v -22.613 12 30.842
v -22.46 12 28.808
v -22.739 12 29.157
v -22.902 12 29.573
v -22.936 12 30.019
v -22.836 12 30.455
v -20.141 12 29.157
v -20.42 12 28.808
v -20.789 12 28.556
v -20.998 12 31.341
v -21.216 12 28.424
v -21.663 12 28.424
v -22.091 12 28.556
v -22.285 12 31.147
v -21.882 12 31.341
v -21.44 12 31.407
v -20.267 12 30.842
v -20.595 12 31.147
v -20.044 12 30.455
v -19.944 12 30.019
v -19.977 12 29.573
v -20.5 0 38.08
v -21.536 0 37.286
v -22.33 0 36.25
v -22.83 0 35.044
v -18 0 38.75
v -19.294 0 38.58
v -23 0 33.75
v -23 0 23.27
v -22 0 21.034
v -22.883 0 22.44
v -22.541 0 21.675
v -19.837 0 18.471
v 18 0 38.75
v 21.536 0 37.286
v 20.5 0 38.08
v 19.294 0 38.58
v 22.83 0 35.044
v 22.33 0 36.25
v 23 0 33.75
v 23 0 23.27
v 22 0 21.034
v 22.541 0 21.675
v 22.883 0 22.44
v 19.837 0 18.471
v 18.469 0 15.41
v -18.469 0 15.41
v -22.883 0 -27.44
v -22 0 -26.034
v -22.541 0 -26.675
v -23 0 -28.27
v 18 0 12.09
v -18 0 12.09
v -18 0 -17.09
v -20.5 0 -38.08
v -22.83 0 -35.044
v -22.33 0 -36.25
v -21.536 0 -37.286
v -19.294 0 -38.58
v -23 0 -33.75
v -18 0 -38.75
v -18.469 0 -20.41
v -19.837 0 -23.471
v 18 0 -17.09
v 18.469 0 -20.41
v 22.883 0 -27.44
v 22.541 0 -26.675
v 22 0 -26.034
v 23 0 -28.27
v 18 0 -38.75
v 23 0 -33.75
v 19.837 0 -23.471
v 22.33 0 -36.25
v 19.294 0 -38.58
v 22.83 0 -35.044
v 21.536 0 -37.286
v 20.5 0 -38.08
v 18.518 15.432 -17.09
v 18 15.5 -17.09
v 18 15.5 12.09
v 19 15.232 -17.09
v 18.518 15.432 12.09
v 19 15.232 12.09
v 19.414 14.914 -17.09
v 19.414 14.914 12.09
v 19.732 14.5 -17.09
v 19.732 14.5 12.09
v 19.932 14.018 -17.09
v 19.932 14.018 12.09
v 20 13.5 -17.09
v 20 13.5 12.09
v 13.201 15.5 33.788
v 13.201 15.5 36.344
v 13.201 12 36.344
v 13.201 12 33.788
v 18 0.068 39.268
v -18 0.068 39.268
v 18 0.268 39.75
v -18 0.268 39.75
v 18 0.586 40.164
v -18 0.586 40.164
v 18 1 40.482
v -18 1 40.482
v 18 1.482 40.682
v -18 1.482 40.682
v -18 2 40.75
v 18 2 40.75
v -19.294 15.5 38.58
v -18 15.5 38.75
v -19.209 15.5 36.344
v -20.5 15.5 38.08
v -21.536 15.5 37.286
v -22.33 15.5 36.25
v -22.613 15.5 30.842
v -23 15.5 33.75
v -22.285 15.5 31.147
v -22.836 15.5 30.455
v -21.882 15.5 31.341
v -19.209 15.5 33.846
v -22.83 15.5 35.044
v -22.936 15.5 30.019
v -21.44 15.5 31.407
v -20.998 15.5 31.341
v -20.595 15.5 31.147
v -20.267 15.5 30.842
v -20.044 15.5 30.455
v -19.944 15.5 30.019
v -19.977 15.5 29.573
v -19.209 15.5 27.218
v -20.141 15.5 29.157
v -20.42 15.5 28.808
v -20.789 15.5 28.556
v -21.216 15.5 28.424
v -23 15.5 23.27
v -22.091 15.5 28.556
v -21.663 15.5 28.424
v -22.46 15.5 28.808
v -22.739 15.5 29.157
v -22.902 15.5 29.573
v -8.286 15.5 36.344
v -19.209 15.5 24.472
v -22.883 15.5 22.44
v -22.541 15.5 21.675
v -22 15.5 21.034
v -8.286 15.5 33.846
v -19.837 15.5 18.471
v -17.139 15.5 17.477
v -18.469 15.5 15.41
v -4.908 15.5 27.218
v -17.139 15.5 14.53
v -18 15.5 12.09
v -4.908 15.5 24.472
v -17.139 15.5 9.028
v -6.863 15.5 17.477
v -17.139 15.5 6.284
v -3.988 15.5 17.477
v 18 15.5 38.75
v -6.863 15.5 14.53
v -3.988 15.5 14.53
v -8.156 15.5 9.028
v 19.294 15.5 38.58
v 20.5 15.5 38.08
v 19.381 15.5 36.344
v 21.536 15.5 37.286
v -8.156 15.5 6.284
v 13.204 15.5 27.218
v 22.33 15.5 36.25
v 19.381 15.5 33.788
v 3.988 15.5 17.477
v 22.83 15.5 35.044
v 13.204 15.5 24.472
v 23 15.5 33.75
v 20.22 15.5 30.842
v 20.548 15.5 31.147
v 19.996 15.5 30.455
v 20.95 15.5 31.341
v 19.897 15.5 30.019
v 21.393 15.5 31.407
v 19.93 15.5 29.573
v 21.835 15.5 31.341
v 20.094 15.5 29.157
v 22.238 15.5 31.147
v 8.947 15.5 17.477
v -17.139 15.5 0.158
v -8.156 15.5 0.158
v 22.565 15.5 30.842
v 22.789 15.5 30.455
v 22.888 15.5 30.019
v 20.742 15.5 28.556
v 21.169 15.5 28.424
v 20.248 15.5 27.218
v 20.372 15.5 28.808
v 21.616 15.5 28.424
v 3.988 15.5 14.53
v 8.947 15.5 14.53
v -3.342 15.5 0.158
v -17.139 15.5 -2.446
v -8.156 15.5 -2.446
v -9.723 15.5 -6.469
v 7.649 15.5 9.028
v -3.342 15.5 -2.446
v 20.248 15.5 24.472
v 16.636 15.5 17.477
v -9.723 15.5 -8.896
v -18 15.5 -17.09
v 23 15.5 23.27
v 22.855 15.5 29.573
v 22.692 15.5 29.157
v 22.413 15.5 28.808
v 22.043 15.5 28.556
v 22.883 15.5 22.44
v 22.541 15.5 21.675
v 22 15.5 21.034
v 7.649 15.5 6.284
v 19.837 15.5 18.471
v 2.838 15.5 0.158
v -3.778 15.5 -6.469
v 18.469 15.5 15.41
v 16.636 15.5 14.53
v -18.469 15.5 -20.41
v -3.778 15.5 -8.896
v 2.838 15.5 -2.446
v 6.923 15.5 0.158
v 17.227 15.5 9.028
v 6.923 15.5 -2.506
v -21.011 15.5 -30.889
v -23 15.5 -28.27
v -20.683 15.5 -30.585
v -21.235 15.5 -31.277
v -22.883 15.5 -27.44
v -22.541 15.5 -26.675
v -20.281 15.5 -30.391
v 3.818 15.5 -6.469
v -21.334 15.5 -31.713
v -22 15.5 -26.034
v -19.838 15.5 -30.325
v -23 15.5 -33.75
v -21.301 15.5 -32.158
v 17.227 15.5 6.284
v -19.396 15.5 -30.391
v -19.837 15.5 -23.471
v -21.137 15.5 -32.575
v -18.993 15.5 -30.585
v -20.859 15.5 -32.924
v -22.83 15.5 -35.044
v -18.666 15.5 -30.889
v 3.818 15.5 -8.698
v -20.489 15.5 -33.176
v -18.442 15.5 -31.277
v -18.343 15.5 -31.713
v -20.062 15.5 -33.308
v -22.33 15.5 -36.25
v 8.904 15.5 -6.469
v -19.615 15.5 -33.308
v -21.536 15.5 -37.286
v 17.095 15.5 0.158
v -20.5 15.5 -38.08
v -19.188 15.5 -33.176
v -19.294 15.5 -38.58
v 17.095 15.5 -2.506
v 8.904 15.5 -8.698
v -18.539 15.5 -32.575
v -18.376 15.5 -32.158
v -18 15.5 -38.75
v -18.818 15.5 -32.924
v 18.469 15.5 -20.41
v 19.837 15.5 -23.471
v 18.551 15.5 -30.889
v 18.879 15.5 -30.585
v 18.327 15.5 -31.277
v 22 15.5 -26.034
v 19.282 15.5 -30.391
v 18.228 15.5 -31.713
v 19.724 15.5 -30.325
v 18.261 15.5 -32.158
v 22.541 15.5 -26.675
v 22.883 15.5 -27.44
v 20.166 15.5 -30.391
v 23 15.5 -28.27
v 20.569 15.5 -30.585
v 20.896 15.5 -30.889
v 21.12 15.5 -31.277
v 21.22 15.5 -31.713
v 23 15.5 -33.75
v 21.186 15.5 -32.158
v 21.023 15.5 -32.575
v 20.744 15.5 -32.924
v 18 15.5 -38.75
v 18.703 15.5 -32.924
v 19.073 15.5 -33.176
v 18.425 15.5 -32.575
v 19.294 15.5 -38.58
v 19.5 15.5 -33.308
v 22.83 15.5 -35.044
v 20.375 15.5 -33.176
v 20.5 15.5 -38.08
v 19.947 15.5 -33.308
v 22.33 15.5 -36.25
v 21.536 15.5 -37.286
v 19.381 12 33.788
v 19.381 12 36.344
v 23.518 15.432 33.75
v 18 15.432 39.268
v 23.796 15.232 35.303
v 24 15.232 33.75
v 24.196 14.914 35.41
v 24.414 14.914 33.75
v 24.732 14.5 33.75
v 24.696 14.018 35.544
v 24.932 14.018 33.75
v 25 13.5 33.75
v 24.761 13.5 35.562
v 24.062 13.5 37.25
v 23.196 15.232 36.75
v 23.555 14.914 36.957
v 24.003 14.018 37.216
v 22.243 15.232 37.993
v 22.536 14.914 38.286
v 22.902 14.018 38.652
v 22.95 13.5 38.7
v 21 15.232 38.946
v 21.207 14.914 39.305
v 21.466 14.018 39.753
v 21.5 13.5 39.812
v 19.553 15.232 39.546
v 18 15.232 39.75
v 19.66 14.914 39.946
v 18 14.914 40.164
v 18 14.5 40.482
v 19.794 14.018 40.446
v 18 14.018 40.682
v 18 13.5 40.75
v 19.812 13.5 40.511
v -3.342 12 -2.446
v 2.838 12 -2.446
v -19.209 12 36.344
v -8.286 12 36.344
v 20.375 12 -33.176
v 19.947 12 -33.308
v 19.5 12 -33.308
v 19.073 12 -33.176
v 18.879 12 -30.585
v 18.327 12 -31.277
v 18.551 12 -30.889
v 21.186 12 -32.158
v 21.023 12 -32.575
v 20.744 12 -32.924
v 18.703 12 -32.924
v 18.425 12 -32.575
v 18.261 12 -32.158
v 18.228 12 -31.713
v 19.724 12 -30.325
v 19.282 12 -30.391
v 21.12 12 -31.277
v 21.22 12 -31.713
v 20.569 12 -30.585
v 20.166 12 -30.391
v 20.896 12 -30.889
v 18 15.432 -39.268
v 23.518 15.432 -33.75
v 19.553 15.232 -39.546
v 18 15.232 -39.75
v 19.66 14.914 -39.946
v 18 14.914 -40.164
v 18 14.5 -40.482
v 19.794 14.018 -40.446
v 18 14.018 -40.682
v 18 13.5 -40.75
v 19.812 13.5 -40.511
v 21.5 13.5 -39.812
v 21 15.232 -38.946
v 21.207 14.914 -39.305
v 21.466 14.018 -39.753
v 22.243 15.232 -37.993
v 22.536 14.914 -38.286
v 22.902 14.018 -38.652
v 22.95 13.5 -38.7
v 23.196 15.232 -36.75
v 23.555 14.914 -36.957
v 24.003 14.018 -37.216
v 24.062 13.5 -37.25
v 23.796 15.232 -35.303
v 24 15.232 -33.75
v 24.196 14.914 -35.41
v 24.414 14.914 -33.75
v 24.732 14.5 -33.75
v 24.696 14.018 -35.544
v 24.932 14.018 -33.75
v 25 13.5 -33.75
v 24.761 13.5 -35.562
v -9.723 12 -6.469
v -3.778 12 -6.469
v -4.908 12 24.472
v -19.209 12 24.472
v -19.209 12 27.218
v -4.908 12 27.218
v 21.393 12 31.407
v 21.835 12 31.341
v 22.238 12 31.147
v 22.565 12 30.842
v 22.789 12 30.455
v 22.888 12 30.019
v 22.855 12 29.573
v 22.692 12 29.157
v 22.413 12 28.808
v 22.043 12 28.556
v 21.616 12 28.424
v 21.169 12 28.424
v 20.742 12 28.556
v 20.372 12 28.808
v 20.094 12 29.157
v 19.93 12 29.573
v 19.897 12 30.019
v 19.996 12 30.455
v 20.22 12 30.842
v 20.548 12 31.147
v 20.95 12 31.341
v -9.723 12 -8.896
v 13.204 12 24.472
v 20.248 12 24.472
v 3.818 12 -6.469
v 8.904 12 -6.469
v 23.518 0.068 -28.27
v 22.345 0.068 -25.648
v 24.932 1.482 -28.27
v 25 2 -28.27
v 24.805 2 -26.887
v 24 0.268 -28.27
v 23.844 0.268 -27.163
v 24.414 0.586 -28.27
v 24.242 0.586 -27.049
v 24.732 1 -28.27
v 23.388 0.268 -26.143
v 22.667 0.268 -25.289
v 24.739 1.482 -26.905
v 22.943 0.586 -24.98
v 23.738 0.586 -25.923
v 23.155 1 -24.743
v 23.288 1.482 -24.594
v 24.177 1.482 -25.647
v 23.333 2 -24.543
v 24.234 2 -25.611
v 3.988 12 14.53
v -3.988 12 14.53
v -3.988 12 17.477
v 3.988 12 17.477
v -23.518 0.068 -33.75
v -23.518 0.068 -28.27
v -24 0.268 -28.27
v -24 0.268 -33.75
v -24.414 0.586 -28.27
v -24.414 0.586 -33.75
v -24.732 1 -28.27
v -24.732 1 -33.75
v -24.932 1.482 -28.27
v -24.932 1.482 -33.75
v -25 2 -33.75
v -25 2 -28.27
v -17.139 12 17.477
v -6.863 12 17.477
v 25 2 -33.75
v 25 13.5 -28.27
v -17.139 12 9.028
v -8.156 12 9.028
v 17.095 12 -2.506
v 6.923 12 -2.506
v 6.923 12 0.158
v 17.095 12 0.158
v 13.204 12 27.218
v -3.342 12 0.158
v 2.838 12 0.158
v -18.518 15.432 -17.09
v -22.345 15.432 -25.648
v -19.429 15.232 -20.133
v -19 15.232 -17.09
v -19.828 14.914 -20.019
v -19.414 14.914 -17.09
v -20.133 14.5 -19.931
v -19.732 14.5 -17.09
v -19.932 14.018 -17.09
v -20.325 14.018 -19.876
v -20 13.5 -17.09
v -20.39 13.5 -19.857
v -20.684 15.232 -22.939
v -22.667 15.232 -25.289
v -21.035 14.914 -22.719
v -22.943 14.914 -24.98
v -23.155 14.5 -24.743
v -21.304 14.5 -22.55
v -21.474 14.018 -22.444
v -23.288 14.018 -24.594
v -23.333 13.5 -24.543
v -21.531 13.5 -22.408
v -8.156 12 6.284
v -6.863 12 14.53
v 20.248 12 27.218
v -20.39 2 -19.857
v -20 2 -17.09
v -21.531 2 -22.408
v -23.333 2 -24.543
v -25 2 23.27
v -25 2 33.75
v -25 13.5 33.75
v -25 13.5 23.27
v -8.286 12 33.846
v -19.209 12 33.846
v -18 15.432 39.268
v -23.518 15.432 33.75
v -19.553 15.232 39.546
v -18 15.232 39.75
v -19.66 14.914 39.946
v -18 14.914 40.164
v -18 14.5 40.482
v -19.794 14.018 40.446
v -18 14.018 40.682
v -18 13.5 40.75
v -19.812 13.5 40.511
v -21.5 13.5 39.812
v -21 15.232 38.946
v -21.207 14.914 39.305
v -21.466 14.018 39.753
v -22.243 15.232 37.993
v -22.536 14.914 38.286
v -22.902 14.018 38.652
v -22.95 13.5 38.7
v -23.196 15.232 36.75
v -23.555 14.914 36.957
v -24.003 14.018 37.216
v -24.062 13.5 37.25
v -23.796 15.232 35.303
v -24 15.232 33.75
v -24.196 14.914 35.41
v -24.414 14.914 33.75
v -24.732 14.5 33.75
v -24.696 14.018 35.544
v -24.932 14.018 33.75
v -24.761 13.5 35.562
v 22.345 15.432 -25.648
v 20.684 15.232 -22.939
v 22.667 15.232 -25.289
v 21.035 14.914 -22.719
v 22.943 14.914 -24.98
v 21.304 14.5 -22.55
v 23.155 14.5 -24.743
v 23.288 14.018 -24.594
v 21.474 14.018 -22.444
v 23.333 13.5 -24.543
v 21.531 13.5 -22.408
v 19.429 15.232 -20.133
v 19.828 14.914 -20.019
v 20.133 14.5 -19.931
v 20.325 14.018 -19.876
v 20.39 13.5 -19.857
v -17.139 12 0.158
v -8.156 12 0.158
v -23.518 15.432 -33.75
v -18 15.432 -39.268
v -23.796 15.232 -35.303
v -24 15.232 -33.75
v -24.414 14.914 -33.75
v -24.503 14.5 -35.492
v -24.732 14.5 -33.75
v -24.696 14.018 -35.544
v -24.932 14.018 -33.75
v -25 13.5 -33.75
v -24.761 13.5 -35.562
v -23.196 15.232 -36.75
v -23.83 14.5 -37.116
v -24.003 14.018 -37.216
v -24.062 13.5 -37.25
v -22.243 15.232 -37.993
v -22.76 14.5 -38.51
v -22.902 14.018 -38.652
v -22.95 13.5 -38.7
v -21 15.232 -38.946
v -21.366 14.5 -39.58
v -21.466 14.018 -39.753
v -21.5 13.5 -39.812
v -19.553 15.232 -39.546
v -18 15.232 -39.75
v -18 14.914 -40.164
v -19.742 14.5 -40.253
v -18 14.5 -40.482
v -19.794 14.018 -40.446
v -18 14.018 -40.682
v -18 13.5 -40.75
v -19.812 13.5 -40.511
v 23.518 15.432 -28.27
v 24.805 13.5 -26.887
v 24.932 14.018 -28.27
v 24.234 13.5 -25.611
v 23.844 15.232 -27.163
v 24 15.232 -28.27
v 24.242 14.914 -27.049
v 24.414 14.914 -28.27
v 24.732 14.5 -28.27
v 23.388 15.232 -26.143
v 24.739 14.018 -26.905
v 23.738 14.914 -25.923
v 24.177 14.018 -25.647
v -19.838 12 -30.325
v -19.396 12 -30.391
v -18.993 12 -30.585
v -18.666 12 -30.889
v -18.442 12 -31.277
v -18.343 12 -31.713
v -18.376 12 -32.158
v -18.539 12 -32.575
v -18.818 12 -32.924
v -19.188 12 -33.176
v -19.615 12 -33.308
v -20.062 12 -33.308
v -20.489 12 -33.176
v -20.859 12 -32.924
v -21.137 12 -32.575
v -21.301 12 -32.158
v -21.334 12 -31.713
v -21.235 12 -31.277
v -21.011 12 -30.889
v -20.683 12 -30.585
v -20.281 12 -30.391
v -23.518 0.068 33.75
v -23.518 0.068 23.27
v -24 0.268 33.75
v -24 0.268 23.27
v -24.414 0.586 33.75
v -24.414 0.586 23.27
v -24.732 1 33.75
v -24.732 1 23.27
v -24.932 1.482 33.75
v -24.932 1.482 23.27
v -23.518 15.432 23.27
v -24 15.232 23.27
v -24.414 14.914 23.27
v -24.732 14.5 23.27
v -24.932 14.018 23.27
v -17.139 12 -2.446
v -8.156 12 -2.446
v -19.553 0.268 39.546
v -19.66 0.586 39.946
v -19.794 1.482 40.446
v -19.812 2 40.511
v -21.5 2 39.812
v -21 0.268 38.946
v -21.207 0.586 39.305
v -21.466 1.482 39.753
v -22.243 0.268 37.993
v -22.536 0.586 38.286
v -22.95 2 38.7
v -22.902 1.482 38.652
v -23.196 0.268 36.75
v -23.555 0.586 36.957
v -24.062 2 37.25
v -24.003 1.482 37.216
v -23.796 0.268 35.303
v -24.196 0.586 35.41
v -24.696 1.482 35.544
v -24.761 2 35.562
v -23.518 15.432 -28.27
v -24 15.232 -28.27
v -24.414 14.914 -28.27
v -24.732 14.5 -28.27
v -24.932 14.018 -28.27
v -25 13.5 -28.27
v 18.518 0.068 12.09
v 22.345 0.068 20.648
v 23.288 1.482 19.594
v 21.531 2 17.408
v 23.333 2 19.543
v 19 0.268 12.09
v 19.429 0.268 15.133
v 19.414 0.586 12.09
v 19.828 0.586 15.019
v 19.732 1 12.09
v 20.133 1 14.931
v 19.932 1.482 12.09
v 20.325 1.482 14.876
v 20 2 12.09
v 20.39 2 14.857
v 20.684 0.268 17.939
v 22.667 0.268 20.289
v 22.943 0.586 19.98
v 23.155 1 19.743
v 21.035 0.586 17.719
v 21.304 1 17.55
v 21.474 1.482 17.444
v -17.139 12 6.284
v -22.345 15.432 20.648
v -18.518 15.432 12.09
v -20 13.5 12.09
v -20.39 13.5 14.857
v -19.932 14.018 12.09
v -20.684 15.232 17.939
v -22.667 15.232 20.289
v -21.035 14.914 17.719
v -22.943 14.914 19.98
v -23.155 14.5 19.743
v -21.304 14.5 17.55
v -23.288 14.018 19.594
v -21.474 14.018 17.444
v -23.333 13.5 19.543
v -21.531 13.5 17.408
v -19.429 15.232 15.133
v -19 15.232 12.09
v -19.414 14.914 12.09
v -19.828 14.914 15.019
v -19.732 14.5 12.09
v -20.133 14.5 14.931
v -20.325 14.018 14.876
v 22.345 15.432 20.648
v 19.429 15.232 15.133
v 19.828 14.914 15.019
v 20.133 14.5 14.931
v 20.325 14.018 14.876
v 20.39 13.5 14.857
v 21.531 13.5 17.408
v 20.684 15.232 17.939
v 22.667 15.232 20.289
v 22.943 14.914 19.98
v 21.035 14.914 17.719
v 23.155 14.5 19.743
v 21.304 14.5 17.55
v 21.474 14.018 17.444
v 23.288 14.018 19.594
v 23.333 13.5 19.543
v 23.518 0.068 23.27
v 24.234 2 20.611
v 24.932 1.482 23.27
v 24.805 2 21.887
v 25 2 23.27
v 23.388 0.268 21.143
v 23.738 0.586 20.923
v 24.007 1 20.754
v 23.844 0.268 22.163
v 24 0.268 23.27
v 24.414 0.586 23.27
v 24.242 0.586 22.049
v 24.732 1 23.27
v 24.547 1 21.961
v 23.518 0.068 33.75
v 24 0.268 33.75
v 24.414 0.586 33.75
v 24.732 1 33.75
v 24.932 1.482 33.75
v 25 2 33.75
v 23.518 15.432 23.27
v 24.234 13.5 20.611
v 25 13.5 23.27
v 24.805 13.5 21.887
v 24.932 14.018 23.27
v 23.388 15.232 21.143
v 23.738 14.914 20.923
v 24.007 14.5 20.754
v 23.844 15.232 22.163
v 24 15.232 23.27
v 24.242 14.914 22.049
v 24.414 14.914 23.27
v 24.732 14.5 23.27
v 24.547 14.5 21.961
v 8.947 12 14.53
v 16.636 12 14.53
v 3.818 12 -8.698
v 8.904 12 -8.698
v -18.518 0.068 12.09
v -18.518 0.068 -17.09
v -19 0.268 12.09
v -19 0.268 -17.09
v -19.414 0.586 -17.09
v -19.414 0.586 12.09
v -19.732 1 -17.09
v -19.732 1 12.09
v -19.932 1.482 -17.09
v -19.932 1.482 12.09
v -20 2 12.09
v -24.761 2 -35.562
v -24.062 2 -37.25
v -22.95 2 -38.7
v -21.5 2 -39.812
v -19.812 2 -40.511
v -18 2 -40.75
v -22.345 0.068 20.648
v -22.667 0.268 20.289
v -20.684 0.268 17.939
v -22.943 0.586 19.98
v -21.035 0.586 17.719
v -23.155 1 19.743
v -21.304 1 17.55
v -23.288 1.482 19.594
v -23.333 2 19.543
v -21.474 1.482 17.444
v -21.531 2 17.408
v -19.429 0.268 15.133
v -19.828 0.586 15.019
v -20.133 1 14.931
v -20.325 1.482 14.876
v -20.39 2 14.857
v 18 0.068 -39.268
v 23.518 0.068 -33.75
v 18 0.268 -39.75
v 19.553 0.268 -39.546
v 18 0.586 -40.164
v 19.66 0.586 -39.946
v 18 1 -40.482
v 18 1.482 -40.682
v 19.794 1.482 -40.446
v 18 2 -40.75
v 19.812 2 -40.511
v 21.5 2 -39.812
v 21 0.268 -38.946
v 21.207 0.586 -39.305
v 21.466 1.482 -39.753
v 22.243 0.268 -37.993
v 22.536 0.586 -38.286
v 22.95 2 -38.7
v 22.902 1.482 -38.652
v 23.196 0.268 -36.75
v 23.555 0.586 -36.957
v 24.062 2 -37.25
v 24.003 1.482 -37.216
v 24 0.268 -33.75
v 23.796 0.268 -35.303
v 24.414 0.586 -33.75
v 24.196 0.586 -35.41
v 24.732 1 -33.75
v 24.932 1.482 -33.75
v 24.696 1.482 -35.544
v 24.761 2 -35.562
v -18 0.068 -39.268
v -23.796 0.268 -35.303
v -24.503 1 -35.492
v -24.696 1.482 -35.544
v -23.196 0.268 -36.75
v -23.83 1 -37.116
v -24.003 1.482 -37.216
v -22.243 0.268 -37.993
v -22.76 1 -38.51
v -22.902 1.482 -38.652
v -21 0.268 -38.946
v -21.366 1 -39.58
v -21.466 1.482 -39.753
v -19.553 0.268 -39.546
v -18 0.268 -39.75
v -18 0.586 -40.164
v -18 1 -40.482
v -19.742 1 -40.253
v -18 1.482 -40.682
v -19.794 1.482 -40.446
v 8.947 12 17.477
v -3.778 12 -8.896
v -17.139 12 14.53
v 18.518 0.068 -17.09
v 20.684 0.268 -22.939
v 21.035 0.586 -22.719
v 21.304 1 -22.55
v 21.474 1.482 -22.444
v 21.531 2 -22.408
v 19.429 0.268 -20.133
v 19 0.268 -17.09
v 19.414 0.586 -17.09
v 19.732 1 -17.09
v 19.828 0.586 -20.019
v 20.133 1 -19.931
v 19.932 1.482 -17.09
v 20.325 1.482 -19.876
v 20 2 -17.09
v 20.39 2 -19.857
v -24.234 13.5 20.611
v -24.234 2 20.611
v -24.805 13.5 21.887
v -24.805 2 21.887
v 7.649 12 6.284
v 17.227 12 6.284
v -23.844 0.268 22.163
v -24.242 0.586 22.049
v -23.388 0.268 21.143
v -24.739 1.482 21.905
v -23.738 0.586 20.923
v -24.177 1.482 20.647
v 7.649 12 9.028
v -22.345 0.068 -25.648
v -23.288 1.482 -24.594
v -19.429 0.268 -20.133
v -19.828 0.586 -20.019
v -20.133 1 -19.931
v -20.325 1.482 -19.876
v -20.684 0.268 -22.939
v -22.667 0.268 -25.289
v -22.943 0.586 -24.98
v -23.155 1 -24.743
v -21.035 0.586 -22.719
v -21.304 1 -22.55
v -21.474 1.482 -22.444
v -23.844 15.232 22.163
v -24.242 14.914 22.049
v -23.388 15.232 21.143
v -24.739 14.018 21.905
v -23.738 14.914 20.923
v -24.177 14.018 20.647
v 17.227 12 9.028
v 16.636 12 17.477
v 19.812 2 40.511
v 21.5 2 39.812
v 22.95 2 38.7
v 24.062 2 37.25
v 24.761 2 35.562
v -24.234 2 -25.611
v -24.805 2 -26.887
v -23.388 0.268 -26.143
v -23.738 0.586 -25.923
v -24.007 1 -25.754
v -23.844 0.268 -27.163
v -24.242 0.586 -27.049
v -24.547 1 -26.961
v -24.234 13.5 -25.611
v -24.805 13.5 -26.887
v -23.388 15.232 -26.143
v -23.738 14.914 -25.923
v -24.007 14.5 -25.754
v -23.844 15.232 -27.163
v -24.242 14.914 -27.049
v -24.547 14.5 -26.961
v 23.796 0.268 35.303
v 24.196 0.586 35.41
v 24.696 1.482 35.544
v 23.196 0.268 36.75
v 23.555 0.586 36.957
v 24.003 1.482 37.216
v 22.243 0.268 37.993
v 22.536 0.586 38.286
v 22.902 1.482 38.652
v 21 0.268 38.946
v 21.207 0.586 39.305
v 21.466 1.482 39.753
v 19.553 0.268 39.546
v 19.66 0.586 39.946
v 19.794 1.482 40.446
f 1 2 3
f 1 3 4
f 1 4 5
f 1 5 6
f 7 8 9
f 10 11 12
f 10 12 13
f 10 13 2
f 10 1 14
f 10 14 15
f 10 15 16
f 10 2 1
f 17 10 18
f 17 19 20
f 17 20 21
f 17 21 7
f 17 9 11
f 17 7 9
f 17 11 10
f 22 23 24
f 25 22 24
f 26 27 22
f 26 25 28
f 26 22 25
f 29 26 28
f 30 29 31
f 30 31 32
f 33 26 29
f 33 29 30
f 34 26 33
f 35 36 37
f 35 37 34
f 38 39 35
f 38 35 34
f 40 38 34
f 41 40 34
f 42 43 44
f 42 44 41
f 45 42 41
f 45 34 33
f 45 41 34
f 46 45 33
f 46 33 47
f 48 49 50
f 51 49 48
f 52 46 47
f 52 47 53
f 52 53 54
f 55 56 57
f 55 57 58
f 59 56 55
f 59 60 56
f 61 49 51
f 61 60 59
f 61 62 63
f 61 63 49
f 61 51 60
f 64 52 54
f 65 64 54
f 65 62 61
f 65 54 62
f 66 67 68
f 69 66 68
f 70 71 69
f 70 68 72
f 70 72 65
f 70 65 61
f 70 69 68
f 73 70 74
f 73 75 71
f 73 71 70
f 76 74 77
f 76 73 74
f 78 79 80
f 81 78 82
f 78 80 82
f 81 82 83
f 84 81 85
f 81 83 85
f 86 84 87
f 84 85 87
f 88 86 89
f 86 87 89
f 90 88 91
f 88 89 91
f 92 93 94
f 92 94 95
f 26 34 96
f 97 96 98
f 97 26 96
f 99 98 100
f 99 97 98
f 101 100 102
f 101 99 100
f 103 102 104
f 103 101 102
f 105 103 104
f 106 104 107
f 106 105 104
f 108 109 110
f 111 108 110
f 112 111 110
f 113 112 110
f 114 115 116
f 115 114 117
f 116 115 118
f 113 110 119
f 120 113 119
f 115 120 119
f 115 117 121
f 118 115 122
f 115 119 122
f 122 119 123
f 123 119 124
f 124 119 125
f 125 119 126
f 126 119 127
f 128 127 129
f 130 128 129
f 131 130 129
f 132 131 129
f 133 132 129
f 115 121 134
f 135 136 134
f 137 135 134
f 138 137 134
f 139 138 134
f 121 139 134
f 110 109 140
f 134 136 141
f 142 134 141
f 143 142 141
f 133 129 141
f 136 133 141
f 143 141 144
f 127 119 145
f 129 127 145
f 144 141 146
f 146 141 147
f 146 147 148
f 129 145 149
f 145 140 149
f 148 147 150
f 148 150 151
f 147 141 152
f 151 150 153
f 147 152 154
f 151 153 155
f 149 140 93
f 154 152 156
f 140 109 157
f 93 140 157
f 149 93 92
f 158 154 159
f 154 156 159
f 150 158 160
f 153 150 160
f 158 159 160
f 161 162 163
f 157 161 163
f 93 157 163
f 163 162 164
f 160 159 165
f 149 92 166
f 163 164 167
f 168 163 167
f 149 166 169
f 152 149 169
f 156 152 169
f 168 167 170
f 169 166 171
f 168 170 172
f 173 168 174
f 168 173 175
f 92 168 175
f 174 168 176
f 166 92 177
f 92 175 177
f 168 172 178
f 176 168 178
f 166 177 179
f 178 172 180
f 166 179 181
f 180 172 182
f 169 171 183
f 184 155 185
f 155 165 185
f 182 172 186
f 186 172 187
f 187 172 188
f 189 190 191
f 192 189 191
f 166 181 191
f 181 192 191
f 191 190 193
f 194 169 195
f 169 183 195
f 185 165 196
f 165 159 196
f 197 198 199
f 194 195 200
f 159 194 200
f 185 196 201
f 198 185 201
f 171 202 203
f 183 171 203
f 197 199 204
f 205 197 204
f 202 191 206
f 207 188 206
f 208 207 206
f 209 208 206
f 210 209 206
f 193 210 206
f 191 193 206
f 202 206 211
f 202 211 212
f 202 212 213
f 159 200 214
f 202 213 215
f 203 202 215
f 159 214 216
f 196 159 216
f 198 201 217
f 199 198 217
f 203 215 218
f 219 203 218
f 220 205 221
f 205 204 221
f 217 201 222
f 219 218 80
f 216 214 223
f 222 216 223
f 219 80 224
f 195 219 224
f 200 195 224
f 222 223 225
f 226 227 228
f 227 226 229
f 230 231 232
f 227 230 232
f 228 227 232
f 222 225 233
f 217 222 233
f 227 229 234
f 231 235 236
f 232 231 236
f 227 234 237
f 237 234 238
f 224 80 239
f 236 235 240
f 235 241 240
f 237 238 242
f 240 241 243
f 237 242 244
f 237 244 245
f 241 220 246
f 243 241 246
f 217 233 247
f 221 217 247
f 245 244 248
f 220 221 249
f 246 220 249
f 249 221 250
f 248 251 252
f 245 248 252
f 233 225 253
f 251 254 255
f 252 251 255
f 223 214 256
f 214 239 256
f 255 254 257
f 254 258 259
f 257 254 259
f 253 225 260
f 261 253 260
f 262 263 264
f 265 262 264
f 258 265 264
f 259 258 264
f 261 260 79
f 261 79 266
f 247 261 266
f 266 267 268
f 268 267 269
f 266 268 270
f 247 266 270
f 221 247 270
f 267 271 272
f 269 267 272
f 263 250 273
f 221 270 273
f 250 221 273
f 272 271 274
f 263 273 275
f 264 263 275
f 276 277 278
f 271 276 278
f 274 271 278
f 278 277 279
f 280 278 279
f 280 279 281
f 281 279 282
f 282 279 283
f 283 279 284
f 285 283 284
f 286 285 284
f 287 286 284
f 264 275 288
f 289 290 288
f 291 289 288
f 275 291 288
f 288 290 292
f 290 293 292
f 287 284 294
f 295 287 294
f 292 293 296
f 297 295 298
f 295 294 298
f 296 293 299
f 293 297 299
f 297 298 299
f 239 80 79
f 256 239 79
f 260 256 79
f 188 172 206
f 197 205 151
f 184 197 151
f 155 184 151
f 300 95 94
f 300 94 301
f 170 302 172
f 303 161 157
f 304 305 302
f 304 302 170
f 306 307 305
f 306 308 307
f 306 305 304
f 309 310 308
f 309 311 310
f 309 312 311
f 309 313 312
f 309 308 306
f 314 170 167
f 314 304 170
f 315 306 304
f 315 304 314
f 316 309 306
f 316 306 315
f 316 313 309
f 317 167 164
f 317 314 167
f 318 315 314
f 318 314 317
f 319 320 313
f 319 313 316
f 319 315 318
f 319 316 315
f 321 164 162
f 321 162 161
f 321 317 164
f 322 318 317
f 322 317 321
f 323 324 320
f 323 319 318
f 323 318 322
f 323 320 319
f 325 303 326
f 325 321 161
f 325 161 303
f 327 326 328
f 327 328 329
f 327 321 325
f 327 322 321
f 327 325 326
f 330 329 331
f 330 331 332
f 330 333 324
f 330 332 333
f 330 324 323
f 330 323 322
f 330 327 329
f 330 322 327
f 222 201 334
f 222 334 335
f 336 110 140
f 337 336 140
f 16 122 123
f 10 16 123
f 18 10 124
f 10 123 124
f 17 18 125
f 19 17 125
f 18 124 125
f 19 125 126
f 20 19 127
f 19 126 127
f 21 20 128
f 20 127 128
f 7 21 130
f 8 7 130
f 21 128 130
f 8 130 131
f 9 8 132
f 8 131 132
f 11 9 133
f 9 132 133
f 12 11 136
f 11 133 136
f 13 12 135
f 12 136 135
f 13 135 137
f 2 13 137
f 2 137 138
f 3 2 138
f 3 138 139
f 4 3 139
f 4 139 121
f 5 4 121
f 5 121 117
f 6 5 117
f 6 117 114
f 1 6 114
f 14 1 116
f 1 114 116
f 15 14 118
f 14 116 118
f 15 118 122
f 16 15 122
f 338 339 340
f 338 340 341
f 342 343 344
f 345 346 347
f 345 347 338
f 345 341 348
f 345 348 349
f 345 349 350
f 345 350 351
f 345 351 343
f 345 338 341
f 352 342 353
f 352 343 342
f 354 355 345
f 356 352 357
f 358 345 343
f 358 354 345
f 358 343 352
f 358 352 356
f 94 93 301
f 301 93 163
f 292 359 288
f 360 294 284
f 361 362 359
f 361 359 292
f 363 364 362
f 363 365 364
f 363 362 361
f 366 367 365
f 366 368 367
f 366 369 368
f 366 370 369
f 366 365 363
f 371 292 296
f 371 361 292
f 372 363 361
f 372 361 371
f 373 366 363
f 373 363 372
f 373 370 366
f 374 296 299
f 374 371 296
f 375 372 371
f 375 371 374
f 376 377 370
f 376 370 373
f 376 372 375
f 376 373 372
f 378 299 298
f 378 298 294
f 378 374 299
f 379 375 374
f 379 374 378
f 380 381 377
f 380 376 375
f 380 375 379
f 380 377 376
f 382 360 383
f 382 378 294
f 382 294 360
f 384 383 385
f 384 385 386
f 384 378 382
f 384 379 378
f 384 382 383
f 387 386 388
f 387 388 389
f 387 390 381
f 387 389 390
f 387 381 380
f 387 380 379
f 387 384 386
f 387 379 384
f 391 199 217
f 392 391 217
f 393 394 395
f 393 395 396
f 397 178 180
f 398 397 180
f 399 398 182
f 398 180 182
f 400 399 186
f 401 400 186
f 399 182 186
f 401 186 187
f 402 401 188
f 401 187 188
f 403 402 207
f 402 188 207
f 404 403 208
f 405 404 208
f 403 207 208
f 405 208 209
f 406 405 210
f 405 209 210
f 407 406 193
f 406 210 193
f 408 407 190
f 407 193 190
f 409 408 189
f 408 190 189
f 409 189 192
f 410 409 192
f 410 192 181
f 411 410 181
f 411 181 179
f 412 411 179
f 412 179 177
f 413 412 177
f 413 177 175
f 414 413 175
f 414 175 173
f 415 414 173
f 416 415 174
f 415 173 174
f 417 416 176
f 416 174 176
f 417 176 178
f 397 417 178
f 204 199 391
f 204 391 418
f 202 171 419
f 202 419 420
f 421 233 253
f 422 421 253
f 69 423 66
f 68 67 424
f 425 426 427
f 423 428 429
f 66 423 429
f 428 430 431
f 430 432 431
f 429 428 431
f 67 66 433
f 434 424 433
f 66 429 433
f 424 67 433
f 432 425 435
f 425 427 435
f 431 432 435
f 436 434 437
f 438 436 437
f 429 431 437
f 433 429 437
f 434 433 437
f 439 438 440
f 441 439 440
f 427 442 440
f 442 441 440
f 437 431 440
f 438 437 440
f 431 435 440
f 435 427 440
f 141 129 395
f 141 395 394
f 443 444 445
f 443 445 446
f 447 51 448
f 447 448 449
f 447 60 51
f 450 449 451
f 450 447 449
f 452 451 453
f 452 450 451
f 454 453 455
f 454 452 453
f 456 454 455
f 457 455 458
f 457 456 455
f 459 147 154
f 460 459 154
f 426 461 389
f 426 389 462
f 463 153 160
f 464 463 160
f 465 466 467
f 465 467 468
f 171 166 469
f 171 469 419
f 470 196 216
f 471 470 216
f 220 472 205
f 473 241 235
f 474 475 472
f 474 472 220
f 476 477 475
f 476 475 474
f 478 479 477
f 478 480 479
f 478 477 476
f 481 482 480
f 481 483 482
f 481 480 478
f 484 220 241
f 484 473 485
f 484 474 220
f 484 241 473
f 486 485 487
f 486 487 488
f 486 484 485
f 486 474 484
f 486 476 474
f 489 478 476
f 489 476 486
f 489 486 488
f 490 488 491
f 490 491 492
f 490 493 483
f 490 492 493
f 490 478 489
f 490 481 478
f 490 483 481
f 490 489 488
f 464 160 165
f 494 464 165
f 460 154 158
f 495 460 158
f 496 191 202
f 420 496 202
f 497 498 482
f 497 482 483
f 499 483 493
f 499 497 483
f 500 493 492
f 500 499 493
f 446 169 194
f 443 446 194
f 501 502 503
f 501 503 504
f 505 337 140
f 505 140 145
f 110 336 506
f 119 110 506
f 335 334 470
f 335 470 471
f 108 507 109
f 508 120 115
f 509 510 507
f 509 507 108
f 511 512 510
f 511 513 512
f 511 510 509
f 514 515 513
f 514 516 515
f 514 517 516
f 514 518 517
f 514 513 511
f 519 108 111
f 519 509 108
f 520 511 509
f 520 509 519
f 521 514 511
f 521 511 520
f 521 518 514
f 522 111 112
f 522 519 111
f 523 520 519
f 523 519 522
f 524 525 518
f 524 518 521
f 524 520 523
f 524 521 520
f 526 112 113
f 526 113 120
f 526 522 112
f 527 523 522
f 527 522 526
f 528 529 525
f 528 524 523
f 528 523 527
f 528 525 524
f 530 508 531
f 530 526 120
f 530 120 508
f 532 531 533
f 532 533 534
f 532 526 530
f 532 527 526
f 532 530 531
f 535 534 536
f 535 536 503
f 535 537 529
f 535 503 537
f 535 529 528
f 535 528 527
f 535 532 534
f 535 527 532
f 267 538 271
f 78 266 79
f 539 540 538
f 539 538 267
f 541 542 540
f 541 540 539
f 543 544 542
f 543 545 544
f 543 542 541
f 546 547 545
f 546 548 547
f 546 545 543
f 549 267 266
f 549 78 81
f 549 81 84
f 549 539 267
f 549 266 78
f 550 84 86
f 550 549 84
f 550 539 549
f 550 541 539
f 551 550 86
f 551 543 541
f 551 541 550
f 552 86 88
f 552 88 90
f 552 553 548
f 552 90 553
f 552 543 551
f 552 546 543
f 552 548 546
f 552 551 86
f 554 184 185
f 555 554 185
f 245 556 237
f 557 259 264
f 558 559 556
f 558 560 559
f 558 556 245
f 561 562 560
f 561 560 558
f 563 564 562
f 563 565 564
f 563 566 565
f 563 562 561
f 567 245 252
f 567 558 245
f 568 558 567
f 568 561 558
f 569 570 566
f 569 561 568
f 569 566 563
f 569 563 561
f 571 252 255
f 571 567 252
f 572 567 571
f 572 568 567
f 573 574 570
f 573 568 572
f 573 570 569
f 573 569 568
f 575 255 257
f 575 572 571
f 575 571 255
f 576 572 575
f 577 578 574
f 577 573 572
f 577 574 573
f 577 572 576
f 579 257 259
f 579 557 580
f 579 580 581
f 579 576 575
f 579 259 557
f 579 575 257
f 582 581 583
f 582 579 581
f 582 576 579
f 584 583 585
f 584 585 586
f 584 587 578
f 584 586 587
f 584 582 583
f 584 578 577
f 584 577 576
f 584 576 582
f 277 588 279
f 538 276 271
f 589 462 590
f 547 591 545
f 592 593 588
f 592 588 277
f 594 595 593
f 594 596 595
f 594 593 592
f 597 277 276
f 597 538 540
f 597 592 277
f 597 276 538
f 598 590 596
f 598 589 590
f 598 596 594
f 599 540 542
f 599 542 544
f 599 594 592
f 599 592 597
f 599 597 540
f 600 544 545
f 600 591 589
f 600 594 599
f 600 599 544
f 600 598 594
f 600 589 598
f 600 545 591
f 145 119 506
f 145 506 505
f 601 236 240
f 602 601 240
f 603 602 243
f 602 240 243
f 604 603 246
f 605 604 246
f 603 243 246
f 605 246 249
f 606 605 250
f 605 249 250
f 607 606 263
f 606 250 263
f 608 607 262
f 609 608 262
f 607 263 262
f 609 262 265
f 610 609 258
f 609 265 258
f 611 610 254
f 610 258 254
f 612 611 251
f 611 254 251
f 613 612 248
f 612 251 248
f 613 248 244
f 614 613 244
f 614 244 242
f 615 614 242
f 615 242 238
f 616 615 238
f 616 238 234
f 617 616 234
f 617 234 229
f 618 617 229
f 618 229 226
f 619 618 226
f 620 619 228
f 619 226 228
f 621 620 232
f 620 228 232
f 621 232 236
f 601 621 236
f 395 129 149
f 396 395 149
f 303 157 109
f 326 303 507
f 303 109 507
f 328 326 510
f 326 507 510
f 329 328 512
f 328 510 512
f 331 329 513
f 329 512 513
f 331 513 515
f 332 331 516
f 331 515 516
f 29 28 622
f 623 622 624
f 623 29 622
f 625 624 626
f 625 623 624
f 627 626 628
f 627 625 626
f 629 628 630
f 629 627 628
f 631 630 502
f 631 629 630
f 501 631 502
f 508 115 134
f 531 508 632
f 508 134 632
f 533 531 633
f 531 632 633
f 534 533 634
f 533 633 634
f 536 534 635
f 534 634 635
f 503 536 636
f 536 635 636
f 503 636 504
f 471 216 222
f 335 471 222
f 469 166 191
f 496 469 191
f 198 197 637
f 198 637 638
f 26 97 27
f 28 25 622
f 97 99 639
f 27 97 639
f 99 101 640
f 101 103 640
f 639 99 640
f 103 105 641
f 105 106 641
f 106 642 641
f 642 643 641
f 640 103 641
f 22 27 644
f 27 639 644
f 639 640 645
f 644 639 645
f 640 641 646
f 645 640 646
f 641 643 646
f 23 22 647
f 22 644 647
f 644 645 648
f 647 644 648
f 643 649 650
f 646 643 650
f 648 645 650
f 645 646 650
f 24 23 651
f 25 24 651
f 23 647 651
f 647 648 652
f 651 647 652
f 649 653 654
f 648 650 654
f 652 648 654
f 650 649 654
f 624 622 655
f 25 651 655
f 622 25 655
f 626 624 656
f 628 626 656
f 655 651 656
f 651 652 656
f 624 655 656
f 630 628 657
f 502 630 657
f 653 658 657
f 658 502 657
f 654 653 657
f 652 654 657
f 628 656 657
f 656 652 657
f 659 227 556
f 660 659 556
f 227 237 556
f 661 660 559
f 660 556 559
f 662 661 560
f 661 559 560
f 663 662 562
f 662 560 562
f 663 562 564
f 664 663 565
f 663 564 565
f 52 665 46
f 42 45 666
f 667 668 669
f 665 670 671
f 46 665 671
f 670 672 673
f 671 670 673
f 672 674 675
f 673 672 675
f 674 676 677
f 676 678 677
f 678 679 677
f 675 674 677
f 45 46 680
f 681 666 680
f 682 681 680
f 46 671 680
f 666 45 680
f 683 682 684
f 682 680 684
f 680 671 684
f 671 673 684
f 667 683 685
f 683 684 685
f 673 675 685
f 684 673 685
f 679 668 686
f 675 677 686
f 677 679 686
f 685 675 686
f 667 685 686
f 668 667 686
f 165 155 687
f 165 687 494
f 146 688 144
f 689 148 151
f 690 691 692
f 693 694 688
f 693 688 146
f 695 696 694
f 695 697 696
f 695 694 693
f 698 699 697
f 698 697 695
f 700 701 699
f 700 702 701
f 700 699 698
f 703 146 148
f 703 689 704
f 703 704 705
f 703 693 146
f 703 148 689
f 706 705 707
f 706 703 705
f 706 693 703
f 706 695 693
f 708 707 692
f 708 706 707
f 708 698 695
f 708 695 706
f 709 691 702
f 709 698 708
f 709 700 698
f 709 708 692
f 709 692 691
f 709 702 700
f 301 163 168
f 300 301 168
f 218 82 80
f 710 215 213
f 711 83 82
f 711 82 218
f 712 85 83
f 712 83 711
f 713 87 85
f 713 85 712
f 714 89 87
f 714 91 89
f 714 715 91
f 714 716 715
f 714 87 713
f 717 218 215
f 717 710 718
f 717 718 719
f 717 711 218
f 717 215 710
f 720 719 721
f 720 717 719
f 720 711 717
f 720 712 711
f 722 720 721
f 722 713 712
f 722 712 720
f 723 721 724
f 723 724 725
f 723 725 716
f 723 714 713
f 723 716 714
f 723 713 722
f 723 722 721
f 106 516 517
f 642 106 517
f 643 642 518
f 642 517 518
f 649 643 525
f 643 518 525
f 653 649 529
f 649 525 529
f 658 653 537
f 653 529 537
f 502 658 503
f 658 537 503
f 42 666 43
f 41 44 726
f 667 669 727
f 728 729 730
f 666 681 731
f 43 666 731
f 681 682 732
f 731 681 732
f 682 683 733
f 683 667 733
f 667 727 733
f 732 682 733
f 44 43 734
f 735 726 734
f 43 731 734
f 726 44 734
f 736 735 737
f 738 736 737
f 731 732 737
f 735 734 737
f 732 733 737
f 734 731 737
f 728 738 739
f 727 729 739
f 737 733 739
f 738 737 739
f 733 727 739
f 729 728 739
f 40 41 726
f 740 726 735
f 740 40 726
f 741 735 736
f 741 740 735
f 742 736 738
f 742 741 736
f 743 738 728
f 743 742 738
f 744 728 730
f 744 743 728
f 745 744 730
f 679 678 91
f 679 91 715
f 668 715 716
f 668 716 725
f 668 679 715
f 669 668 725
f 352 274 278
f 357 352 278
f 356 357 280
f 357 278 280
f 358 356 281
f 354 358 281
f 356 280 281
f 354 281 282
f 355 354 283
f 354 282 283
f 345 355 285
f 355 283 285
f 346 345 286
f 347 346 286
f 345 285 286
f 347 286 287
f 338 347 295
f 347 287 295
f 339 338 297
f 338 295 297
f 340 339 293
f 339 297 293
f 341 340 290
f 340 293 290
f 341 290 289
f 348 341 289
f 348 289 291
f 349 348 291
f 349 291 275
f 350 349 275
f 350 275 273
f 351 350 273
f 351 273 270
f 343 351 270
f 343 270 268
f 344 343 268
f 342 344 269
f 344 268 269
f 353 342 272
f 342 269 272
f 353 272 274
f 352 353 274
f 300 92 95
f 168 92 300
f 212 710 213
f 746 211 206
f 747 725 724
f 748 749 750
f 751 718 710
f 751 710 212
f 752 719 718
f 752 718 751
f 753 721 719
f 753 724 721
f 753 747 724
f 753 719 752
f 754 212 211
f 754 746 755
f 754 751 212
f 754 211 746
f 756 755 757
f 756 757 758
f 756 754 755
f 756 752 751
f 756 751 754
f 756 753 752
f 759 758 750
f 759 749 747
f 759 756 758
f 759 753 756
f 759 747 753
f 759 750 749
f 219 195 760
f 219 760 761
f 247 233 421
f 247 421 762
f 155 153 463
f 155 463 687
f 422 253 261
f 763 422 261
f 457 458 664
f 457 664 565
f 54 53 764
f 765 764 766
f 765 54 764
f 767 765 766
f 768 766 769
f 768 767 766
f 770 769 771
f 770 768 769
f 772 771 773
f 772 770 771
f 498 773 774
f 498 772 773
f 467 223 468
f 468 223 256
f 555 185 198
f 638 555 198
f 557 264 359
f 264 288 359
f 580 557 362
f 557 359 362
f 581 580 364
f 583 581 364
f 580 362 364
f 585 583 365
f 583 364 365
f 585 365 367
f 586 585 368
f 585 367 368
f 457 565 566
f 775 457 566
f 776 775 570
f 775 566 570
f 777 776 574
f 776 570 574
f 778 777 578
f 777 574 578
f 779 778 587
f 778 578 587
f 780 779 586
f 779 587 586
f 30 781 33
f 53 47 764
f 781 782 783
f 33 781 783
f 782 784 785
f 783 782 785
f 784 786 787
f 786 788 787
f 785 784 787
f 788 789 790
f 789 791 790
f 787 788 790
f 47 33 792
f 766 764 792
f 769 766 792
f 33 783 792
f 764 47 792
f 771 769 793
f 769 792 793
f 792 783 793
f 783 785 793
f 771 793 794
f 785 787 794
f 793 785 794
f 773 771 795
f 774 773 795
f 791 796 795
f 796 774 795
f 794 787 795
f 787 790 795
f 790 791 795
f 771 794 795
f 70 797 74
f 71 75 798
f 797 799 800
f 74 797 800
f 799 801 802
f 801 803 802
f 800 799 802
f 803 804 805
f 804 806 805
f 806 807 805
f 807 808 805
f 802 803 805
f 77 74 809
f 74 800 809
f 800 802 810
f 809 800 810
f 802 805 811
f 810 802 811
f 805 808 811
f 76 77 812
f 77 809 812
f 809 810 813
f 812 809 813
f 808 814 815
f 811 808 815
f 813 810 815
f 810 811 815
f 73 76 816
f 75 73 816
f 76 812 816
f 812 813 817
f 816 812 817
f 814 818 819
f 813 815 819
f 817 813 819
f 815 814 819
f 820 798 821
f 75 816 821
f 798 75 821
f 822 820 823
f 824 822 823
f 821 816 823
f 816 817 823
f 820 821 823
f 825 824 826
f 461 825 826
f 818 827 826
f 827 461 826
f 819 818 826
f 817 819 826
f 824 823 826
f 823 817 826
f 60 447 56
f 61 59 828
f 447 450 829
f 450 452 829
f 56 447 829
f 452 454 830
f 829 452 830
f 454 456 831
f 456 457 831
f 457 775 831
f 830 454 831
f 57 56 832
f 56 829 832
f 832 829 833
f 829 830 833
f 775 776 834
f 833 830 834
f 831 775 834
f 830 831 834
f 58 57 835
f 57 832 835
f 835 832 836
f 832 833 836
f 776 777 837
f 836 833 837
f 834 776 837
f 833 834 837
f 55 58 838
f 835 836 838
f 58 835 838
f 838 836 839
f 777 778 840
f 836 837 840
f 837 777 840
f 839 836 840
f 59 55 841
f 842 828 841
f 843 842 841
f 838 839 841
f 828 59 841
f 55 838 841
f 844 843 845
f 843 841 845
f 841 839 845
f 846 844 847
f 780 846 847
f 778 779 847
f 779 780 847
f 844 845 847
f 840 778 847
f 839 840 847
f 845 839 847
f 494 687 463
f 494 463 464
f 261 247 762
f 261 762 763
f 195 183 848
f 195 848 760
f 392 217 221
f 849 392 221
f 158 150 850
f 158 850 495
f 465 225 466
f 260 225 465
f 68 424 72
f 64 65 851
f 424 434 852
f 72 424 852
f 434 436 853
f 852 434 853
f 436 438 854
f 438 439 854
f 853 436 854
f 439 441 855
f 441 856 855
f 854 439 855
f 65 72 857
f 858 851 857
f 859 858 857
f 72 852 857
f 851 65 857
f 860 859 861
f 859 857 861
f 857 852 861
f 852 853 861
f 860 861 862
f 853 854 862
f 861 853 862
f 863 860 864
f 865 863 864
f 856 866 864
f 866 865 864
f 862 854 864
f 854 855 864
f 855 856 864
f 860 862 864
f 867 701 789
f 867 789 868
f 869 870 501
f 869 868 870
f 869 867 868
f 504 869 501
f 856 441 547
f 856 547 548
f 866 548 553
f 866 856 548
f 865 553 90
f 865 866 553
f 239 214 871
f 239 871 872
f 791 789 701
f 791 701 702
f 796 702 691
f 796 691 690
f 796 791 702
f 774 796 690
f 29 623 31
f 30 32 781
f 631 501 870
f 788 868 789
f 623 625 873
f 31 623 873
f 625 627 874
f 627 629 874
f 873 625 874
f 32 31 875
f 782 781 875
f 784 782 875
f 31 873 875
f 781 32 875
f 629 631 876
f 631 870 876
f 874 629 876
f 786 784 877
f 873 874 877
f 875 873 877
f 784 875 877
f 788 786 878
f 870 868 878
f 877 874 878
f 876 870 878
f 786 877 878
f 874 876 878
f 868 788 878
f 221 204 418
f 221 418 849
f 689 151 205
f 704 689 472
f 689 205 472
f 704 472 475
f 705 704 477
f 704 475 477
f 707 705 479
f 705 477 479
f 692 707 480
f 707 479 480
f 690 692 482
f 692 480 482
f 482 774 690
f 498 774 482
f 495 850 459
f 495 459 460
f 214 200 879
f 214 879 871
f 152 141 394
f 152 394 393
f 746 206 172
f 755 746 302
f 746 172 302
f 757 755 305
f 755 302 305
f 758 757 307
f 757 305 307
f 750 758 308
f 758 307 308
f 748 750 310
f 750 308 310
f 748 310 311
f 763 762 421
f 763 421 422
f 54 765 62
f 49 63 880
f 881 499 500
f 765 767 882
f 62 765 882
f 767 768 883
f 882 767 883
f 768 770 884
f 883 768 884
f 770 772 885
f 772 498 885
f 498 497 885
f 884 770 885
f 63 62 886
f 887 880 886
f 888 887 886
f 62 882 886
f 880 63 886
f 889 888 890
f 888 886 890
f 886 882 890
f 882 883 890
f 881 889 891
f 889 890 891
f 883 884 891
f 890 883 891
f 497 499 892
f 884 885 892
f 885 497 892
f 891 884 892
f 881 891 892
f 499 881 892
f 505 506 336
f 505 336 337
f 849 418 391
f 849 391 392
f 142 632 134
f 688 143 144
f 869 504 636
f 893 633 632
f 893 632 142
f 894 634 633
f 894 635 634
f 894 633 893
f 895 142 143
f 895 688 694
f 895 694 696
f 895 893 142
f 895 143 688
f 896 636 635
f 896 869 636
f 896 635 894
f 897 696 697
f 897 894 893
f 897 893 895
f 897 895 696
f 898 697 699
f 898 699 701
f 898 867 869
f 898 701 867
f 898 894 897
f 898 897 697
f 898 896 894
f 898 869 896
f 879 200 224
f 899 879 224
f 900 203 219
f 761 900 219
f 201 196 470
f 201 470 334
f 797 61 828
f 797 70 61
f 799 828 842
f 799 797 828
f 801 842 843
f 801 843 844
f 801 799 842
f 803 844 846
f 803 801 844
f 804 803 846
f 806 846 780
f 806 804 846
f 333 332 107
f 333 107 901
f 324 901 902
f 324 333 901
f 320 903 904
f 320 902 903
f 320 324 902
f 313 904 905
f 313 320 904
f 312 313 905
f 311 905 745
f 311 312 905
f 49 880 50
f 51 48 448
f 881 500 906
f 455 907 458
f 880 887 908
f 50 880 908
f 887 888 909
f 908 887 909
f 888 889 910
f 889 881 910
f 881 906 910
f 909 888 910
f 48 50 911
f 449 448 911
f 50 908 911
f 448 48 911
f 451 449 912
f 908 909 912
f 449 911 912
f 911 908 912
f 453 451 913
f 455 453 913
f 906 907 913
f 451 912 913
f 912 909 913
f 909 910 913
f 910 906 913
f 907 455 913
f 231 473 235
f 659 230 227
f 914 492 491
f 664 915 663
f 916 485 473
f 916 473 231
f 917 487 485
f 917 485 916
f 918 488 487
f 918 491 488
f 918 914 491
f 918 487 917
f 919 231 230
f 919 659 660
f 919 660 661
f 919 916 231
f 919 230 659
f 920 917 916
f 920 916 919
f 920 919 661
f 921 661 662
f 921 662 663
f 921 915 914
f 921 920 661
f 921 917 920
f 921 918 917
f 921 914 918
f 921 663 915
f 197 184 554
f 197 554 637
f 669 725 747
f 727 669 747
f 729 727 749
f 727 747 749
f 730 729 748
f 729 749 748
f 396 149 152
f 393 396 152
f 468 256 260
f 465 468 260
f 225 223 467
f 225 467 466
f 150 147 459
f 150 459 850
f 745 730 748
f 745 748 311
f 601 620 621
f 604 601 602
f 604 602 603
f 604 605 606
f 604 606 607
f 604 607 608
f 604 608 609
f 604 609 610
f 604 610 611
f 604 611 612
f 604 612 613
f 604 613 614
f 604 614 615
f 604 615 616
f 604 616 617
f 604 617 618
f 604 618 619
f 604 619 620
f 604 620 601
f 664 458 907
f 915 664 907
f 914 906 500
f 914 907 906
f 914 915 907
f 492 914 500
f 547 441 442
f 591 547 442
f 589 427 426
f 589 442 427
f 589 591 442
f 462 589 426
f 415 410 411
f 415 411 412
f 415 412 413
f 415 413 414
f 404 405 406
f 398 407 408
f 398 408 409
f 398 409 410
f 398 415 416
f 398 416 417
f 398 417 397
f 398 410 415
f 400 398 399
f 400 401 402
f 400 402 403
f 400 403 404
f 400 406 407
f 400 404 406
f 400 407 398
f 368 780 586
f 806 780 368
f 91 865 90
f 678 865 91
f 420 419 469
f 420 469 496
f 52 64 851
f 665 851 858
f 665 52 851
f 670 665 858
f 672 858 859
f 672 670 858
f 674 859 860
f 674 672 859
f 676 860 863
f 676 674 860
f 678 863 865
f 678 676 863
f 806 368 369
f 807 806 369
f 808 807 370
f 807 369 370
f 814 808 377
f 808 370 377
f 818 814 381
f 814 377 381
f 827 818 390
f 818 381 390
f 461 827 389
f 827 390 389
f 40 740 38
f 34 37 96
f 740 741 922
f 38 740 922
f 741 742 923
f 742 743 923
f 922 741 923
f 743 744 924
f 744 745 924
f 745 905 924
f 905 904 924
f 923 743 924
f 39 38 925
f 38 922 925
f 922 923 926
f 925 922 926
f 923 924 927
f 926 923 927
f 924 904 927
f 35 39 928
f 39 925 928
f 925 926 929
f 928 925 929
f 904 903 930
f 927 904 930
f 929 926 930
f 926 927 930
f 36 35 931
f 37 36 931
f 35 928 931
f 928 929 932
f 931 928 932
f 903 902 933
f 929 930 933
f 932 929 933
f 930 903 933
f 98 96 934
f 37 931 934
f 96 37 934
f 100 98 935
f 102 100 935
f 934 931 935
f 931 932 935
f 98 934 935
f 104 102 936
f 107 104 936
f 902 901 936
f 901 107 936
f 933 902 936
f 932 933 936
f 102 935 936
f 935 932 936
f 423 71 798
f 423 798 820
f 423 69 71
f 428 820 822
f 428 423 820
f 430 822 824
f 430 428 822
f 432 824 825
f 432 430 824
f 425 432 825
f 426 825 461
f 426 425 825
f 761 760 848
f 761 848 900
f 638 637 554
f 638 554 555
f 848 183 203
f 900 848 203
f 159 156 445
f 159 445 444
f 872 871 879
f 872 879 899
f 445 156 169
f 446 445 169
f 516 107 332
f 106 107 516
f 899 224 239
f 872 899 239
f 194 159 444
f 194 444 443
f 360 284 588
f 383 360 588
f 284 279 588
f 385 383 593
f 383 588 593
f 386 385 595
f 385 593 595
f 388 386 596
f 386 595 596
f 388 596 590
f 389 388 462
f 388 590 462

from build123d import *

# Parameters (mm, degrees)
BOSS_EXTRUDE1_DEPTH = 15.5
FILLET1_R           = 7
FILLET2_R           = 10
FILLET3_R           = 5
FILLET4_R           = 2
SKETCH2_R           = 1.5
SKETCH2_W           = 10.92280205
SKETCH2_H           = 2.497802755
SKETCH2_W_2         = 14.300247421
SKETCH2_H_2         = 2.745251167
SKETCH2_W_3         = 6.180006424
SKETCH2_H_3         = 2.556024723
SKETCH2_W_4         = 7.044858218
SKETCH2_W_5         = 10.276057193
SKETCH2_H_4         = 2.946282132
SKETCH2_W_6         = 7.976519918
SKETCH2_W_7         = 7.689077759
SKETCH2_W_8         = 8.982567476
SKETCH2_H_5         = 2.60403982
SKETCH2_W_9         = 6.180006423
SKETCH2_W_10        = 10.172310113
SKETCH2_H_6         = 2.663918404
SKETCH2_W_11        = 5.94485656
SKETCH2_H_7         = 2.427407937
SKETCH2_W_12        = 5.086155057
SKETCH2_H_8         = 2.229246052
SKETCH2_H_9         = 2.744285017
SKETCH2_W_13        = 9.577824458
CUT_EXTRUDE1_DEPTH  = 3.5


with BuildPart() as part:
    # Sketch1 → Boss-Extrude1 (new body)
    with BuildSketch(Plane(origin=(0, 0, 0), x_dir=(1, 0, 0), z_dir=(0, 1, 0))):
        Polygon((25, -40.75), (-25, -40.75), (-25, -20.75), (-20, -20.75), (-20, 25.75), (-25, 25.75), (-25, 40.75), (25, 40.75), (25, 25.75), (20, 25.75), (20, -20.75), (25, -20.75), align=None)
    extrude(amount=BOSS_EXTRUDE1_DEPTH)

    # Fillet1
    fillet1_edges = [part.edges().sort_by_distance(p)[0] for p in [
        (-25, 7.75, -40.75),
        (25, 7.75, -40.75),
        (25, 7.75, 40.75),
        (-25, 7.75, 40.75),
    ]]
    fillet(fillet1_edges, radius=FILLET1_R)

    # Fillet2
    # the kernel refuses this fillet: 10 mm, written as the material it adds along each edge
    with BuildSketch(Plane(origin=(-20, 0, 20.75), x_dir=(-1, 0, 0), z_dir=(0, 1, 0))) as fillet2_piece_1:
        with BuildLine():
            CenterArc((10, -8.660254038), FILLET2_R, 120, 60)
            Line((0, -8.660254038), (-0.2, -8.660254038))
            Line((-0.2, -8.660254038), (-0.2, 0))
            Line((-0.2, 0), (0, 0.2))
            ThreePointArc((0, 0.2), (2.5, 0.2), (4.9, 0.173205081))
            Line((4.9, 0.173205081), (5, 0))
        make_face()
    extrude(amount=15.5)
    with BuildSketch(Plane(origin=(-20, 0, -25.75), x_dir=(0, 0, 1), z_dir=(0, 1, 0))) as fillet2_piece_2:
        with BuildLine():
            CenterArc((8.660254038, -10), FILLET2_R, 90, 60)
            Line((0, -5), (-0.173205081, -4.9))
            ThreePointArc((-0.173205081, -4.9), (-0.2, -2.5), (-0.2, 0))
            Line((-0.2, 0), (0, 0.2))
            Line((0, 0.2), (8.660254038, 0.2))
            Line((8.660254038, 0.2), (8.660254038, 0))
        make_face()
    extrude(amount=15.5)
    with BuildSketch(Plane(origin=(20, 0, 20.75), x_dir=(1, 0, 0), z_dir=(0, 1, 0))) as fillet2_piece_3:
        with BuildLine():
            CenterArc((10, 8.660254038), FILLET2_R, 180, 60)
            Line((0, 8.660254038), (-0.2, 8.660254038))
            Line((-0.2, 8.660254038), (-0.2, 0))
            Line((-0.2, 0), (0, -0.2))
            ThreePointArc((0, -0.2), (2.5, -0.2), (4.9, -0.173205081))
            Line((4.9, -0.173205081), (5, 0))
        make_face()
    extrude(amount=15.5)
    with BuildSketch(Plane(origin=(20, 0, -25.75), x_dir=(0, 0, 1), z_dir=(0, 1, 0))) as fillet2_piece_4:
        with BuildLine():
            CenterArc((8.660254038, 10), FILLET2_R, 210, 60)
            Line((0, 5), (-0.173205081, 4.9))
            ThreePointArc((-0.173205081, 4.9), (-0.2, 2.5), (-0.2, 0))
            Line((-0.2, 0), (0, -0.2))
            Line((0, -0.2), (8.660254038, -0.2))
            Line((8.660254038, -0.2), (8.660254038, 0))
        make_face()
    extrude(amount=15.5)

    # Fillet3
    fillet3_edges = [part.edges().sort_by_distance(p)[0] for p in [
        (25, 7.75, -25.75),
        (25, 7.75, 20.75),
        (-25, 7.75, 20.75),
        (-25, 7.75, -25.75),
    ]]
    fillet(fillet3_edges, radius=FILLET3_R)

    # Fillet4
    fillet4_edges = [part.edges().sort_by_distance(p)[0] for p in [
        (0, 0, -40.75),
        (0, 15.5, -40.75),
        (-25, 0, -31.010042925),
        (25, 0, 28.510042925),
        (0, 0, 40.75),
        (22.949747468, 0, 38.699747468),
        (-22.949747468, 0, 38.699747468),
        (-22.949747468, 0, -38.699747468),
        (22.949747468, 0, -38.699747468),
        (-25, 15.5, -31.010042925),
        (0, 15.5, 40.75),
        (25, 15.5, 28.510042925),
        (22.949747468, 15.5, 38.699747468),
        (-22.949747468, 15.5, 38.699747468),
        (-22.949747468, 15.5, -38.699747468),
        (22.949747468, 15.5, -38.699747468),
        (-20, 0, -2.5),
        (-20, 15.5, -2.5),
        (20, 0, -2.5),
        (20, 15.5, -2.5),
        (-20.871290708, 15.5, 16.172228867),
        (-20.871290708, 0, -21.172228867),
        (20.871290708, 0, 16.172228867),
        (20.871290708, 15.5, -21.172228867),
        (-25, 0, 28.510042925),
        (-25, 15.5, 28.510042925),
        (25, 0, -31.010042925),
        (20.871290708, 0, -21.172228867),
        (-20.871290708, 0, 16.172228867),
        (-24.564354646, 0, -26.228844397),
        (24.564354646, 0, -26.228844397),
        (24.564354646, 0, 21.228844397),
        (-24.564354646, 0, 21.228844397),
        (25, 15.5, -31.010042925),
        (-20.871290708, 15.5, -21.172228867),
        (20.871290708, 15.5, 16.172228867),
        (-24.564354646, 15.5, -26.228844397),
        (24.564354646, 15.5, -26.228844397),
        (24.564354646, 15.5, 21.228844397),
        (-24.564354646, 15.5, 21.228844397),
    ]]
    fillet(fillet4_edges, radius=FILLET4_R)

    # Sketch2 → Cut-Extrude1 (cut)
    with BuildSketch(Plane(origin=(0, 15.5, 0), x_dir=(1, 0, 0), z_dir=(0, 1, 0))):
        with Locations(Location((-21.439879839, -29.907193015, 0), (0, 0, 270))):
            Circle(SKETCH2_R)
        with Locations(Location((21.392609924, -29.907193015, 0), (0, 0, 270))):
            Circle(SKETCH2_R)
        with Locations(Location((-19.83836984, 31.824604268, 0), (0, 0, 270))):
            Circle(SKETCH2_R)
        with Locations(Location((19.72370758, 31.824604268, 0), (0, 0, 270))):
            Circle(SKETCH2_R)
        with Locations((-13.747194041, -35.095106184)):
            Rectangle(SKETCH2_W, SKETCH2_H)
        with Locations((-12.058471356, -25.845093422)):
            Rectangle(SKETCH2_W_2, SKETCH2_H_2)
        with Locations((16.290511598, -35.0659952)):
            Rectangle(SKETCH2_W_3, SKETCH2_H_3)
        with Locations((16.72604395, -25.845093422)):
            Rectangle(SKETCH2_W_4, SKETCH2_H_2)
        with Locations((-12.000710148, -16.003419816)):
            Rectangle(SKETCH2_W_5, SKETCH2_H_4)
        with Locations((0, -16.003419816)):
            Rectangle(SKETCH2_W_6, SKETCH2_H_4)
        with Locations((12.791176086, -16.003419816)):
            Rectangle(SKETCH2_W_7, SKETCH2_H_4)
        with Locations((-12.647455006, 1.143849121)):
            Rectangle(SKETCH2_W_8, SKETCH2_H_5)
        with Locations((-0.251511889, 1.143849121)):
            Rectangle(SKETCH2_W_9, SKETCH2_H_5)
        with Locations((12.008853949, 1.173788413)):
            Rectangle(SKETCH2_W_10, SKETCH2_H_6)
        with Locations((-6.750471196, 7.68245568)):
            Rectangle(SKETCH2_W_11, SKETCH2_H_7)
        with Locations((6.361240217, 7.583374737)):
            Rectangle(SKETCH2_W_12, SKETCH2_H_8)
        with Locations((-12.647455006, -7.655884762)):
            Rectangle(SKETCH2_W_8, SKETCH2_H_9)
        with Locations((12.4382047, -7.655884762)):
            Rectangle(SKETCH2_W_13, SKETCH2_H_9)
    extrude(amount=-CUT_EXTRUDE1_DEPTH, mode=Mode.SUBTRACT)


solid = part.part
